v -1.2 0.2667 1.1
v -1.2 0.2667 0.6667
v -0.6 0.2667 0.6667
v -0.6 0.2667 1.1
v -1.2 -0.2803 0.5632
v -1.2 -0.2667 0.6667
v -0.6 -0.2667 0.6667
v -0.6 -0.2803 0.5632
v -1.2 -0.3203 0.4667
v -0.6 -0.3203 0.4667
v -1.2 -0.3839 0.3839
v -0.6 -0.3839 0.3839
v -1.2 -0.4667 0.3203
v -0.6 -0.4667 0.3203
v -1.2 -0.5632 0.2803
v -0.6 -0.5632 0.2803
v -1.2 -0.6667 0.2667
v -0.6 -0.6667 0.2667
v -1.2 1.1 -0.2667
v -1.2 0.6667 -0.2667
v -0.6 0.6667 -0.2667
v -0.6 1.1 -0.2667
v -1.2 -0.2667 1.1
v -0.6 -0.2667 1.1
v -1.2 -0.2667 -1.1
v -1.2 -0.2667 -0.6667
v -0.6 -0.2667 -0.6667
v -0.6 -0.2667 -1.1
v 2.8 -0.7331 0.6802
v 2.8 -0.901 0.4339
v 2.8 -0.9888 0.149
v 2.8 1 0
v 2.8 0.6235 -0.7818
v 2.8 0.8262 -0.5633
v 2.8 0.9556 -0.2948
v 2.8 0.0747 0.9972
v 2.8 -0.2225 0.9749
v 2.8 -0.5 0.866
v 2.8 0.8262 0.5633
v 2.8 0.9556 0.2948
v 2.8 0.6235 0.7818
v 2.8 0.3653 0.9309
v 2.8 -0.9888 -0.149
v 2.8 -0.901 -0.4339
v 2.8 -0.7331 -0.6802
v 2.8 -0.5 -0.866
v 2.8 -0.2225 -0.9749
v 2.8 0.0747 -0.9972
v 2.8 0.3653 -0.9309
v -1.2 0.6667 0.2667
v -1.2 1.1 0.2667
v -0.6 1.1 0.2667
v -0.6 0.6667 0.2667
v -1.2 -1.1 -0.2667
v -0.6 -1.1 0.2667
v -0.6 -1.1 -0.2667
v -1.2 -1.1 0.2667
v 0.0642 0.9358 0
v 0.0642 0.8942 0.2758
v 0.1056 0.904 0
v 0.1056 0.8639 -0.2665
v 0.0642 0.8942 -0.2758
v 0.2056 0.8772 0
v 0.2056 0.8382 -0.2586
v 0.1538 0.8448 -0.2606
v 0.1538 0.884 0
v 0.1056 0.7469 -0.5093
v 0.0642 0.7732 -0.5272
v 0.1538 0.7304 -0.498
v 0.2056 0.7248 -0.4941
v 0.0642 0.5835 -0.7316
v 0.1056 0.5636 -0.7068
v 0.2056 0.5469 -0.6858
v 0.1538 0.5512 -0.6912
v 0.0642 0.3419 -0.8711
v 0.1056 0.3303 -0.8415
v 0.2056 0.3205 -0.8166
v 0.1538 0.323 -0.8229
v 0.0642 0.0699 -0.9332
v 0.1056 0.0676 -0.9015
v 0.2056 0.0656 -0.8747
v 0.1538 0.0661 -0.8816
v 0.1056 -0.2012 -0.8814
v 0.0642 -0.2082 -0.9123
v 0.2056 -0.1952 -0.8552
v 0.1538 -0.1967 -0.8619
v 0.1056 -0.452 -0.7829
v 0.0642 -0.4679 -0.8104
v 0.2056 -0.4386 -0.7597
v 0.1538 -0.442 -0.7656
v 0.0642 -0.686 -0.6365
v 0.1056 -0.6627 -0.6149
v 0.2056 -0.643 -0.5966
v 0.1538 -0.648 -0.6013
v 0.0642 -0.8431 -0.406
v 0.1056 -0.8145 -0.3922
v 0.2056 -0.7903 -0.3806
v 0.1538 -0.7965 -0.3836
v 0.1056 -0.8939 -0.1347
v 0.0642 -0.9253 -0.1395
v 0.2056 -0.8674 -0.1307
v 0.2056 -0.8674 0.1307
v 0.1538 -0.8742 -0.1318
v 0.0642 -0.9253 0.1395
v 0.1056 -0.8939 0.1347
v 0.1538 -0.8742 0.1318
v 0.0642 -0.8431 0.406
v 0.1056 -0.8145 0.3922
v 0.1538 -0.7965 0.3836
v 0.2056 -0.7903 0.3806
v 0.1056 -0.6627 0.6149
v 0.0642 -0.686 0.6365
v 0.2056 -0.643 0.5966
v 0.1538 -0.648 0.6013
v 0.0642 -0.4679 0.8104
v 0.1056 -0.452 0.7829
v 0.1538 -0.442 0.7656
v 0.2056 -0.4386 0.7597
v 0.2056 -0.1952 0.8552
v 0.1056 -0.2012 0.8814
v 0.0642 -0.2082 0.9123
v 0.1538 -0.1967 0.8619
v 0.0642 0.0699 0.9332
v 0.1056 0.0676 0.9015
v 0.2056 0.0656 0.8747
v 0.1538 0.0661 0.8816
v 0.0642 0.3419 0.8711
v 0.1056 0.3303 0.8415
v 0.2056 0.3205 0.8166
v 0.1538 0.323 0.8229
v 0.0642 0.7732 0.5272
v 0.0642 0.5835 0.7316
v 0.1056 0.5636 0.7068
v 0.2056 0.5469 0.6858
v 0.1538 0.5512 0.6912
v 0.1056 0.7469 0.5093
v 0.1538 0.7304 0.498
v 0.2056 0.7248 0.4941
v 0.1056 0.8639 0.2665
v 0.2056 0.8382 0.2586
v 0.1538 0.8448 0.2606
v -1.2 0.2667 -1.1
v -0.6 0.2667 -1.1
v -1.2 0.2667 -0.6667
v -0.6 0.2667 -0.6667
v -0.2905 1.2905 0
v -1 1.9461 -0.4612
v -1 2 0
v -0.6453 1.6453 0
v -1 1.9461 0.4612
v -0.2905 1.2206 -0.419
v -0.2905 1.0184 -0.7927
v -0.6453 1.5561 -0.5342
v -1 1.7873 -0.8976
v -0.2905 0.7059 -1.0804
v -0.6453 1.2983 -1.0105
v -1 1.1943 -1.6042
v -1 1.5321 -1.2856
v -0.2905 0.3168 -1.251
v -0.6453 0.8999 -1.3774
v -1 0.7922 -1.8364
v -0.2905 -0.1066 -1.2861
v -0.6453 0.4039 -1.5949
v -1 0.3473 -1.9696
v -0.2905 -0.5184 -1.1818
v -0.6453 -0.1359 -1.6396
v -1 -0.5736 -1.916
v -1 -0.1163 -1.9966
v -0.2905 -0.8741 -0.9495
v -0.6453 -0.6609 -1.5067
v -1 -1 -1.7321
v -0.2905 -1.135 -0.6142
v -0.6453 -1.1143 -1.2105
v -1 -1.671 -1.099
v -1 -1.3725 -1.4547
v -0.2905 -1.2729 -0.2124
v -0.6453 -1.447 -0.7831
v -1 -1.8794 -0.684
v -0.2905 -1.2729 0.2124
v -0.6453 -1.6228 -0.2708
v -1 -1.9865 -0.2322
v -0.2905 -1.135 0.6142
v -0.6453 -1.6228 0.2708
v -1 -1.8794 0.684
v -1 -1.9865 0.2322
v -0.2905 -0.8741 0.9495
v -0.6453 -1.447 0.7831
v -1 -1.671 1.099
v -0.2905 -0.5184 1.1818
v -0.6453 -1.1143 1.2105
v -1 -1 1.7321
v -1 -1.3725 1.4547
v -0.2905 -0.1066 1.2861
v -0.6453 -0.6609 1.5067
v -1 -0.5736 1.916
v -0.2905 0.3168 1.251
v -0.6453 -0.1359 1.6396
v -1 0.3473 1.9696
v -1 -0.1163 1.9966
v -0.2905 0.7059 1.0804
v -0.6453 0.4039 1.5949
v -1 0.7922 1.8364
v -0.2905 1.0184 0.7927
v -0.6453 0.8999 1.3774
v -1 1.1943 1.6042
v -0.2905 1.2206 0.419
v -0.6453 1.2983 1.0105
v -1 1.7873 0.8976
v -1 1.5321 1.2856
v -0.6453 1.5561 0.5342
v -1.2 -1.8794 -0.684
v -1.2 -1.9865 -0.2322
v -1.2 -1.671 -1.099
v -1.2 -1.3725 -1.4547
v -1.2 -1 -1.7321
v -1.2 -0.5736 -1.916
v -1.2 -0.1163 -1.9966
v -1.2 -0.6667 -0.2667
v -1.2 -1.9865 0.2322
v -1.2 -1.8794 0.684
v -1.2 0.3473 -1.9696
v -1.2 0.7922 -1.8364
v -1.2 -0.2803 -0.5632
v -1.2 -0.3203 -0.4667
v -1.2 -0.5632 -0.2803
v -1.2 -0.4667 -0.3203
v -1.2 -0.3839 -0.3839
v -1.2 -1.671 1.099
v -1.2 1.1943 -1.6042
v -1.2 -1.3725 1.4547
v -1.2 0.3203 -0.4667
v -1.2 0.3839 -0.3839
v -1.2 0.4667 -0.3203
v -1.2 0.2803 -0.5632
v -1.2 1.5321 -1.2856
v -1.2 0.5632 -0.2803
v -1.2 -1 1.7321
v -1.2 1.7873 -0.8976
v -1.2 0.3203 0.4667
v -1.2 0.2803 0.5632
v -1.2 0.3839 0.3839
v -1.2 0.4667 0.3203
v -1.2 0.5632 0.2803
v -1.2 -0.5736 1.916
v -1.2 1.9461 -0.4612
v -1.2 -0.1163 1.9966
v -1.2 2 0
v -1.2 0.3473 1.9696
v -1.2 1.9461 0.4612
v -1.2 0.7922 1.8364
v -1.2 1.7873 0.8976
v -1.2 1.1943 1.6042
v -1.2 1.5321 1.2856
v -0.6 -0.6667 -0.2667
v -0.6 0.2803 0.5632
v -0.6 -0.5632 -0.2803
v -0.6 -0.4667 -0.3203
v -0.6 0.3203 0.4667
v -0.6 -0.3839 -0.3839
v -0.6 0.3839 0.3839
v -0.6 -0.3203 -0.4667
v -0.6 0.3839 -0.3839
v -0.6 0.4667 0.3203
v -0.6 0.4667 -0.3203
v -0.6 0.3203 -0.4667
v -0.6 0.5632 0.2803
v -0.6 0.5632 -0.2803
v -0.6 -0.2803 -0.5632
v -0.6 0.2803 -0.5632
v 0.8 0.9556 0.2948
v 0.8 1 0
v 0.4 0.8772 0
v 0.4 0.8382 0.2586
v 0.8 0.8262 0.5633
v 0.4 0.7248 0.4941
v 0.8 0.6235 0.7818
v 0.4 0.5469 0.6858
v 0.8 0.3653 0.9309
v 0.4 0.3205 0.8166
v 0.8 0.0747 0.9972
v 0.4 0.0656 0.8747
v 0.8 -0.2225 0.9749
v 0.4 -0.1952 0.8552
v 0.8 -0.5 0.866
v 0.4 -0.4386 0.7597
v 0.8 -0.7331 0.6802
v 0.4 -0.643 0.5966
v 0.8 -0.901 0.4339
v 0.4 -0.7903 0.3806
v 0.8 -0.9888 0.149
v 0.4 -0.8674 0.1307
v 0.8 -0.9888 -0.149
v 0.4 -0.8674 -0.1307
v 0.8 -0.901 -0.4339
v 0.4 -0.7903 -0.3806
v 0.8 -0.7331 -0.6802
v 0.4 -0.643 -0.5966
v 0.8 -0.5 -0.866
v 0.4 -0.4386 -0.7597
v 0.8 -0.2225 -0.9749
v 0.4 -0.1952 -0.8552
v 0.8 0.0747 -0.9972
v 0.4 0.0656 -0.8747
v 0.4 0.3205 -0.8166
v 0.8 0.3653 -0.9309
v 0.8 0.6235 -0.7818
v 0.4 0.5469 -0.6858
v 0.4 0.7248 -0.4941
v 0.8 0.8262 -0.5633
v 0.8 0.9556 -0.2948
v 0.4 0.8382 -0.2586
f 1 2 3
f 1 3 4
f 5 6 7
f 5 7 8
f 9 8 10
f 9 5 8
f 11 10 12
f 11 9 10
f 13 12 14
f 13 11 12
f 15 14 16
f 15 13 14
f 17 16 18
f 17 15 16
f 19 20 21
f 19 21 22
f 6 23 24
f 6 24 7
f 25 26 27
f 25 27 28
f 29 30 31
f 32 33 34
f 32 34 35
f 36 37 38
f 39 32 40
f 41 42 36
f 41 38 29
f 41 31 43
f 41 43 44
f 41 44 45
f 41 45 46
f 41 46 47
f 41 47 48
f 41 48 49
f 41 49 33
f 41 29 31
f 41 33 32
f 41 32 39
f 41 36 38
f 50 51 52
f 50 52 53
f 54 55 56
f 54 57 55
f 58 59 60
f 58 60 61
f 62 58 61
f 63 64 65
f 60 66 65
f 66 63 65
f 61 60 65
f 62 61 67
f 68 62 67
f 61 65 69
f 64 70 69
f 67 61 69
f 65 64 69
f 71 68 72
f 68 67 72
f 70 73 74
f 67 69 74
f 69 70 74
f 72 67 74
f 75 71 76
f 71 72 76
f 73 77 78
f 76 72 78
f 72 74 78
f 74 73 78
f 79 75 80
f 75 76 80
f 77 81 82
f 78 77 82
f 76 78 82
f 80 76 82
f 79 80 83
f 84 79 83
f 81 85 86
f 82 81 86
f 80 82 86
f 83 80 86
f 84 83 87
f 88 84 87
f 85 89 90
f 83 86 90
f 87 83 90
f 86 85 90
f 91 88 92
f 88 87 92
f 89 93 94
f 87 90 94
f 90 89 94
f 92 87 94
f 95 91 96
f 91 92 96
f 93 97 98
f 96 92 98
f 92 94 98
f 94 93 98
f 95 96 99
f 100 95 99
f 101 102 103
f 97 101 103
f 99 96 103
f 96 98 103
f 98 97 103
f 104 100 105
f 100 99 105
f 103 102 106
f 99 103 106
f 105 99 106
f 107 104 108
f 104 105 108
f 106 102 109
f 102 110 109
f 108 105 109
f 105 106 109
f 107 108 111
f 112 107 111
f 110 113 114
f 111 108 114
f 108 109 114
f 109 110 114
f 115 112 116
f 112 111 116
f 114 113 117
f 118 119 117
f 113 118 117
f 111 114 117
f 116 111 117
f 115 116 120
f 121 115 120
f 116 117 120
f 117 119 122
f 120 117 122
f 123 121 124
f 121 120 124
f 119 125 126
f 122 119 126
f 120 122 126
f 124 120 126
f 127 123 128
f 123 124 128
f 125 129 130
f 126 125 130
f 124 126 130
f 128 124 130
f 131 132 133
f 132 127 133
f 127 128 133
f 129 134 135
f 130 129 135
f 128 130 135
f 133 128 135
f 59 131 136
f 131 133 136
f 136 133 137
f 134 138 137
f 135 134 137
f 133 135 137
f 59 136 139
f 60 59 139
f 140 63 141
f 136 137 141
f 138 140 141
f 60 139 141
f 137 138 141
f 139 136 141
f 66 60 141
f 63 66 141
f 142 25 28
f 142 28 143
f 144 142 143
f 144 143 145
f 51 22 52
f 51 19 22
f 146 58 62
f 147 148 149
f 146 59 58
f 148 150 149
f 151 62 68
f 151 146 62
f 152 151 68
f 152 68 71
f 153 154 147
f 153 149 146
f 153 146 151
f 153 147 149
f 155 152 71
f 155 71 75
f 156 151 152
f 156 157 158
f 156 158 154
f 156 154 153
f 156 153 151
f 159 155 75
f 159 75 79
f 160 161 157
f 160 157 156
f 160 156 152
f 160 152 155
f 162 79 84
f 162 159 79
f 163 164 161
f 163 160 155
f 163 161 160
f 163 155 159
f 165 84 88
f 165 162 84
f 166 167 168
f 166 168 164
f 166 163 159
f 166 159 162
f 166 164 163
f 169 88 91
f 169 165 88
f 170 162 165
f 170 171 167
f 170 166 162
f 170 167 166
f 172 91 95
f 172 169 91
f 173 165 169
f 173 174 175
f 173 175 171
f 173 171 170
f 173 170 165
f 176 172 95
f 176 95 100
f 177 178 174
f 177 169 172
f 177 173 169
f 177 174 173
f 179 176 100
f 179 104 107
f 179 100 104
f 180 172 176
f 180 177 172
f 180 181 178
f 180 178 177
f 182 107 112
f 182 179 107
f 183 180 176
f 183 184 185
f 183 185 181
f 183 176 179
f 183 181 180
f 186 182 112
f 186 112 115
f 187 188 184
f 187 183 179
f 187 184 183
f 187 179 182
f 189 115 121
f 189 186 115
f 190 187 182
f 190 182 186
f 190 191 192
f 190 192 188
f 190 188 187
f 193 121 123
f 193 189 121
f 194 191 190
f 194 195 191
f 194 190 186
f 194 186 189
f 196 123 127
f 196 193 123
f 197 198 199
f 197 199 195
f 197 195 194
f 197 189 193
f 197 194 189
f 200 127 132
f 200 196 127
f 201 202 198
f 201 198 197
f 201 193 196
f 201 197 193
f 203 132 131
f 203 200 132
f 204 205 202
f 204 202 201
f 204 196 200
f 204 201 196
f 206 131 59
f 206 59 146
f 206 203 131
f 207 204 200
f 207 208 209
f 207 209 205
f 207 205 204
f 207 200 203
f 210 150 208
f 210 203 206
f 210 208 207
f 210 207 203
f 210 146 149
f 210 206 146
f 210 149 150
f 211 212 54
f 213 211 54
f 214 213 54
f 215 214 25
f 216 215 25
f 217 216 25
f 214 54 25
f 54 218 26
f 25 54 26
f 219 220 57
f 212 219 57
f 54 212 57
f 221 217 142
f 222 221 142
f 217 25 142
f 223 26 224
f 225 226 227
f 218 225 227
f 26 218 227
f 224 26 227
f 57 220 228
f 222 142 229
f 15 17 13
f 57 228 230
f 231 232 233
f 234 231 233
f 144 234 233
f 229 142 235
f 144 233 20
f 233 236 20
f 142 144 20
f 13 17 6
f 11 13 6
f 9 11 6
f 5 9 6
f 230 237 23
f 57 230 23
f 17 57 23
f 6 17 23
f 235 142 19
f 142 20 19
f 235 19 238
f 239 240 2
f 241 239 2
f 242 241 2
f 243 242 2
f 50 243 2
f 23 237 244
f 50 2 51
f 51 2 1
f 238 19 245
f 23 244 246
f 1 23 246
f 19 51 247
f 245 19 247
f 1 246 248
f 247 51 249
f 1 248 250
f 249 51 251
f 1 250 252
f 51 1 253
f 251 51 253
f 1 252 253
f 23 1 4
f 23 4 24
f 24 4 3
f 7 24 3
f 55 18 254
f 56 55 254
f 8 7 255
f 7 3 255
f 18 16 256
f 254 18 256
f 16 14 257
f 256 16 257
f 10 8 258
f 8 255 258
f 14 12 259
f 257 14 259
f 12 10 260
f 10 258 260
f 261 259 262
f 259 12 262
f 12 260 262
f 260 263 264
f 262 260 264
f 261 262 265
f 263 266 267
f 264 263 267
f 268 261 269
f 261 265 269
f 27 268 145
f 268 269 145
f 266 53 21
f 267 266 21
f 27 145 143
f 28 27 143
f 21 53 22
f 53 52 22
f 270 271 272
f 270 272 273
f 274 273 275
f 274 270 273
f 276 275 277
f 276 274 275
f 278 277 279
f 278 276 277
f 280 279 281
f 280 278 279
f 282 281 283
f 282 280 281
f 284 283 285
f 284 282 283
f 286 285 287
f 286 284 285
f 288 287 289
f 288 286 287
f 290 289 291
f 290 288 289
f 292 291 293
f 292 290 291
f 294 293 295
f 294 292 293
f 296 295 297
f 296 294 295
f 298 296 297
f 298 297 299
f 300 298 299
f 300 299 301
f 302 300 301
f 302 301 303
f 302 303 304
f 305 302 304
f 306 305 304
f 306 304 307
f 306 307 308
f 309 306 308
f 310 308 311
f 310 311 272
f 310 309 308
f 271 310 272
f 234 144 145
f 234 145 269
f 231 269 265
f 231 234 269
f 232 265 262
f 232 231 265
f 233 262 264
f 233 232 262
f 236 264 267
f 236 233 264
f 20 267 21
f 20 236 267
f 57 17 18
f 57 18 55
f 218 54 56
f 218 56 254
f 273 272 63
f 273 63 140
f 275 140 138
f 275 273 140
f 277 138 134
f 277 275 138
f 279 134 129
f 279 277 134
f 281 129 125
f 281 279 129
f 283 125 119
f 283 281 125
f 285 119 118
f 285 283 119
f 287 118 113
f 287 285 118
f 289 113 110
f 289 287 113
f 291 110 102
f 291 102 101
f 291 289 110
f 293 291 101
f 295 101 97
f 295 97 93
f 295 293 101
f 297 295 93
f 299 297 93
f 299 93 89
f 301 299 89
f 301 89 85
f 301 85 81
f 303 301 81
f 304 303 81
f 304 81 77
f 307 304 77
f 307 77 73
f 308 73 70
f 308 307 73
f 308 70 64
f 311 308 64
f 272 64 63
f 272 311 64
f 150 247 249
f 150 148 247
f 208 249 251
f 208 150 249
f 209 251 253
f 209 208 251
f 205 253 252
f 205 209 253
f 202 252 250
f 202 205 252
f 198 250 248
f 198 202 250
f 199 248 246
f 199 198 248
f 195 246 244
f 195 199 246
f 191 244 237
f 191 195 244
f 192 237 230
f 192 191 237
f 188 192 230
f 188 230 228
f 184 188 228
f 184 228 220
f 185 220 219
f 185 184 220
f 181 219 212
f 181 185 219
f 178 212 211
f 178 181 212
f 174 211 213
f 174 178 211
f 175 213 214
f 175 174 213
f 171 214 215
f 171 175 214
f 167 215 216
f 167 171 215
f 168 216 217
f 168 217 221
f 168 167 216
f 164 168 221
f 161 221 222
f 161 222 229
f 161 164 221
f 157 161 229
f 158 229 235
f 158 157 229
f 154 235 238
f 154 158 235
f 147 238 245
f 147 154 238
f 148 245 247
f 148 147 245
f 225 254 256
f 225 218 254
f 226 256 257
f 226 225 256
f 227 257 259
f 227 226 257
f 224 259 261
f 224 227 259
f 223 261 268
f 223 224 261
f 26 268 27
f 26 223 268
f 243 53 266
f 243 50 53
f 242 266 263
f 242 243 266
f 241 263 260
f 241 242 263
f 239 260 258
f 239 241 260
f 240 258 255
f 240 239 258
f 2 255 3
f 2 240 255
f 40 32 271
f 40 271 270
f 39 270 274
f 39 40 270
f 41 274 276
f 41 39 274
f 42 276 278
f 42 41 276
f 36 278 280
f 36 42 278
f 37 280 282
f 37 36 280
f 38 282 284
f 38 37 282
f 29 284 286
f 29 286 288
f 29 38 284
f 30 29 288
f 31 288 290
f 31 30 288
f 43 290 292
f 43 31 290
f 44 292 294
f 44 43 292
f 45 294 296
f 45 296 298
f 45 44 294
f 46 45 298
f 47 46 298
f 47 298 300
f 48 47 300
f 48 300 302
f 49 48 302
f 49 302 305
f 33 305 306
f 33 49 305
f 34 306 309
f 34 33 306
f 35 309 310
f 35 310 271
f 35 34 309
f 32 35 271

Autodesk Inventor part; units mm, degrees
sketch "Sketch_1" plane through (0, 0, 0) normal (0, 0, 1) x (1, 0, 0)
  line L0 (2.8, 0) -> (-1.2, 0)
  line L1 (-1.2, 0) -> (-1.2, 2)
  line L2 (-1.2, 2) -> (-1, 2)
  line L3 (-1, 2) -> (0.0642, 0.9358)
  arc A0 (0.0642, 0.9358) -> (0.2056, 0.8772) centre (0.2056, 1.0772) ccw
  line L4 (0.2056, 0.8772) -> (0.4, 0.8772)
  line L5 (0.4, 0.8772) -> (0.8, 1)
  line L6 (0.8, 1) -> (2.8, 1)
  line L7 (2.8, 1) -> (2.8, 0)
  line L8 (2.8, 0) -> (-1.2, 0)
revolve "Revolution1" add sketch "Sketch_1" angle 360 about axis through (2.8, 0, 0) along (1, 0, 0)
thread "Thread1" size "M2x0.4" class "6g" standard "ISO Metric profile" full length
sketch "Sketch_2" plane through (-1.2, 0, 0) normal (1, 0, 0) x (0, 0, -1)
  line L0 (-1.1, -0.2667) -> (-0.6667, -0.2667)
  arc A0 (-0.2667, -0.6667) -> (-0.6667, -0.2667) centre (-0.6667, -0.6667) ccw
  line L1 (-0.2667, -0.6667) -> (-0.2667, -1.1)
  line L2 (-0.2667, -1.1) -> (0.2667, -1.1)
  line L3 (0.2667, -1.1) -> (0.2667, -0.6667)
  arc A1 (0.6667, -0.2667) -> (0.2667, -0.6667) centre (0.6667, -0.6667) ccw
  line L4 (0.6667, -0.2667) -> (1.1, -0.2667)
  line L5 (1.1, -0.2667) -> (1.1, 0.2667)
  line L6 (1.1, 0.2667) -> (0.6667, 0.2667)
  arc A2 (0.2667, 0.6667) -> (0.6667, 0.2667) centre (0.6667, 0.6667) ccw
  line L7 (0.2667, 0.6667) -> (0.2667, 1.1)
  line L8 (0.2667, 1.1) -> (-0.2667, 1.1)
  line L9 (-0.2667, 1.1) -> (-0.2667, 0.6667)
  arc A3 (-0.6667, 0.2667) -> (-0.2667, 0.6667) centre (-0.6667, 0.6667) ccw
  line L10 (-0.6667, 0.2667) -> (-1.1, 0.2667)
  line L11 (-1.1, 0.2667) -> (-1.1, -0.2667)
extrude "Extrusion1" cut sketch "Sketch_2" along normal blind 0.6
ref_plane "bolt_XY" through (-1.2, 0, 0) normal (1, 0, 0) x (0, 0, -1)
ref_plane "bolt_YZ" through (-1.2, 0, 0) normal (0, 0, -1) x (0, 1, 0)
ref_plane "bolt_ZX" through (-1.2, 0, 0) normal (0, 1, 0) x (1, 0, 0)
ref_plane "nut_XY" through (2.8, 0, 0) normal (1, 0, 0) x (0, 0, -1)
ref_plane "nut_YZ" through (2.8, 0, 0) normal (0, 0, -1) x (0, 1, 0)
ref_plane "nut_ZX" through (2.8, 0, 0) normal (0, 1, 0) x (1, 0, 0)
properties part number "BFBJ2-4"
